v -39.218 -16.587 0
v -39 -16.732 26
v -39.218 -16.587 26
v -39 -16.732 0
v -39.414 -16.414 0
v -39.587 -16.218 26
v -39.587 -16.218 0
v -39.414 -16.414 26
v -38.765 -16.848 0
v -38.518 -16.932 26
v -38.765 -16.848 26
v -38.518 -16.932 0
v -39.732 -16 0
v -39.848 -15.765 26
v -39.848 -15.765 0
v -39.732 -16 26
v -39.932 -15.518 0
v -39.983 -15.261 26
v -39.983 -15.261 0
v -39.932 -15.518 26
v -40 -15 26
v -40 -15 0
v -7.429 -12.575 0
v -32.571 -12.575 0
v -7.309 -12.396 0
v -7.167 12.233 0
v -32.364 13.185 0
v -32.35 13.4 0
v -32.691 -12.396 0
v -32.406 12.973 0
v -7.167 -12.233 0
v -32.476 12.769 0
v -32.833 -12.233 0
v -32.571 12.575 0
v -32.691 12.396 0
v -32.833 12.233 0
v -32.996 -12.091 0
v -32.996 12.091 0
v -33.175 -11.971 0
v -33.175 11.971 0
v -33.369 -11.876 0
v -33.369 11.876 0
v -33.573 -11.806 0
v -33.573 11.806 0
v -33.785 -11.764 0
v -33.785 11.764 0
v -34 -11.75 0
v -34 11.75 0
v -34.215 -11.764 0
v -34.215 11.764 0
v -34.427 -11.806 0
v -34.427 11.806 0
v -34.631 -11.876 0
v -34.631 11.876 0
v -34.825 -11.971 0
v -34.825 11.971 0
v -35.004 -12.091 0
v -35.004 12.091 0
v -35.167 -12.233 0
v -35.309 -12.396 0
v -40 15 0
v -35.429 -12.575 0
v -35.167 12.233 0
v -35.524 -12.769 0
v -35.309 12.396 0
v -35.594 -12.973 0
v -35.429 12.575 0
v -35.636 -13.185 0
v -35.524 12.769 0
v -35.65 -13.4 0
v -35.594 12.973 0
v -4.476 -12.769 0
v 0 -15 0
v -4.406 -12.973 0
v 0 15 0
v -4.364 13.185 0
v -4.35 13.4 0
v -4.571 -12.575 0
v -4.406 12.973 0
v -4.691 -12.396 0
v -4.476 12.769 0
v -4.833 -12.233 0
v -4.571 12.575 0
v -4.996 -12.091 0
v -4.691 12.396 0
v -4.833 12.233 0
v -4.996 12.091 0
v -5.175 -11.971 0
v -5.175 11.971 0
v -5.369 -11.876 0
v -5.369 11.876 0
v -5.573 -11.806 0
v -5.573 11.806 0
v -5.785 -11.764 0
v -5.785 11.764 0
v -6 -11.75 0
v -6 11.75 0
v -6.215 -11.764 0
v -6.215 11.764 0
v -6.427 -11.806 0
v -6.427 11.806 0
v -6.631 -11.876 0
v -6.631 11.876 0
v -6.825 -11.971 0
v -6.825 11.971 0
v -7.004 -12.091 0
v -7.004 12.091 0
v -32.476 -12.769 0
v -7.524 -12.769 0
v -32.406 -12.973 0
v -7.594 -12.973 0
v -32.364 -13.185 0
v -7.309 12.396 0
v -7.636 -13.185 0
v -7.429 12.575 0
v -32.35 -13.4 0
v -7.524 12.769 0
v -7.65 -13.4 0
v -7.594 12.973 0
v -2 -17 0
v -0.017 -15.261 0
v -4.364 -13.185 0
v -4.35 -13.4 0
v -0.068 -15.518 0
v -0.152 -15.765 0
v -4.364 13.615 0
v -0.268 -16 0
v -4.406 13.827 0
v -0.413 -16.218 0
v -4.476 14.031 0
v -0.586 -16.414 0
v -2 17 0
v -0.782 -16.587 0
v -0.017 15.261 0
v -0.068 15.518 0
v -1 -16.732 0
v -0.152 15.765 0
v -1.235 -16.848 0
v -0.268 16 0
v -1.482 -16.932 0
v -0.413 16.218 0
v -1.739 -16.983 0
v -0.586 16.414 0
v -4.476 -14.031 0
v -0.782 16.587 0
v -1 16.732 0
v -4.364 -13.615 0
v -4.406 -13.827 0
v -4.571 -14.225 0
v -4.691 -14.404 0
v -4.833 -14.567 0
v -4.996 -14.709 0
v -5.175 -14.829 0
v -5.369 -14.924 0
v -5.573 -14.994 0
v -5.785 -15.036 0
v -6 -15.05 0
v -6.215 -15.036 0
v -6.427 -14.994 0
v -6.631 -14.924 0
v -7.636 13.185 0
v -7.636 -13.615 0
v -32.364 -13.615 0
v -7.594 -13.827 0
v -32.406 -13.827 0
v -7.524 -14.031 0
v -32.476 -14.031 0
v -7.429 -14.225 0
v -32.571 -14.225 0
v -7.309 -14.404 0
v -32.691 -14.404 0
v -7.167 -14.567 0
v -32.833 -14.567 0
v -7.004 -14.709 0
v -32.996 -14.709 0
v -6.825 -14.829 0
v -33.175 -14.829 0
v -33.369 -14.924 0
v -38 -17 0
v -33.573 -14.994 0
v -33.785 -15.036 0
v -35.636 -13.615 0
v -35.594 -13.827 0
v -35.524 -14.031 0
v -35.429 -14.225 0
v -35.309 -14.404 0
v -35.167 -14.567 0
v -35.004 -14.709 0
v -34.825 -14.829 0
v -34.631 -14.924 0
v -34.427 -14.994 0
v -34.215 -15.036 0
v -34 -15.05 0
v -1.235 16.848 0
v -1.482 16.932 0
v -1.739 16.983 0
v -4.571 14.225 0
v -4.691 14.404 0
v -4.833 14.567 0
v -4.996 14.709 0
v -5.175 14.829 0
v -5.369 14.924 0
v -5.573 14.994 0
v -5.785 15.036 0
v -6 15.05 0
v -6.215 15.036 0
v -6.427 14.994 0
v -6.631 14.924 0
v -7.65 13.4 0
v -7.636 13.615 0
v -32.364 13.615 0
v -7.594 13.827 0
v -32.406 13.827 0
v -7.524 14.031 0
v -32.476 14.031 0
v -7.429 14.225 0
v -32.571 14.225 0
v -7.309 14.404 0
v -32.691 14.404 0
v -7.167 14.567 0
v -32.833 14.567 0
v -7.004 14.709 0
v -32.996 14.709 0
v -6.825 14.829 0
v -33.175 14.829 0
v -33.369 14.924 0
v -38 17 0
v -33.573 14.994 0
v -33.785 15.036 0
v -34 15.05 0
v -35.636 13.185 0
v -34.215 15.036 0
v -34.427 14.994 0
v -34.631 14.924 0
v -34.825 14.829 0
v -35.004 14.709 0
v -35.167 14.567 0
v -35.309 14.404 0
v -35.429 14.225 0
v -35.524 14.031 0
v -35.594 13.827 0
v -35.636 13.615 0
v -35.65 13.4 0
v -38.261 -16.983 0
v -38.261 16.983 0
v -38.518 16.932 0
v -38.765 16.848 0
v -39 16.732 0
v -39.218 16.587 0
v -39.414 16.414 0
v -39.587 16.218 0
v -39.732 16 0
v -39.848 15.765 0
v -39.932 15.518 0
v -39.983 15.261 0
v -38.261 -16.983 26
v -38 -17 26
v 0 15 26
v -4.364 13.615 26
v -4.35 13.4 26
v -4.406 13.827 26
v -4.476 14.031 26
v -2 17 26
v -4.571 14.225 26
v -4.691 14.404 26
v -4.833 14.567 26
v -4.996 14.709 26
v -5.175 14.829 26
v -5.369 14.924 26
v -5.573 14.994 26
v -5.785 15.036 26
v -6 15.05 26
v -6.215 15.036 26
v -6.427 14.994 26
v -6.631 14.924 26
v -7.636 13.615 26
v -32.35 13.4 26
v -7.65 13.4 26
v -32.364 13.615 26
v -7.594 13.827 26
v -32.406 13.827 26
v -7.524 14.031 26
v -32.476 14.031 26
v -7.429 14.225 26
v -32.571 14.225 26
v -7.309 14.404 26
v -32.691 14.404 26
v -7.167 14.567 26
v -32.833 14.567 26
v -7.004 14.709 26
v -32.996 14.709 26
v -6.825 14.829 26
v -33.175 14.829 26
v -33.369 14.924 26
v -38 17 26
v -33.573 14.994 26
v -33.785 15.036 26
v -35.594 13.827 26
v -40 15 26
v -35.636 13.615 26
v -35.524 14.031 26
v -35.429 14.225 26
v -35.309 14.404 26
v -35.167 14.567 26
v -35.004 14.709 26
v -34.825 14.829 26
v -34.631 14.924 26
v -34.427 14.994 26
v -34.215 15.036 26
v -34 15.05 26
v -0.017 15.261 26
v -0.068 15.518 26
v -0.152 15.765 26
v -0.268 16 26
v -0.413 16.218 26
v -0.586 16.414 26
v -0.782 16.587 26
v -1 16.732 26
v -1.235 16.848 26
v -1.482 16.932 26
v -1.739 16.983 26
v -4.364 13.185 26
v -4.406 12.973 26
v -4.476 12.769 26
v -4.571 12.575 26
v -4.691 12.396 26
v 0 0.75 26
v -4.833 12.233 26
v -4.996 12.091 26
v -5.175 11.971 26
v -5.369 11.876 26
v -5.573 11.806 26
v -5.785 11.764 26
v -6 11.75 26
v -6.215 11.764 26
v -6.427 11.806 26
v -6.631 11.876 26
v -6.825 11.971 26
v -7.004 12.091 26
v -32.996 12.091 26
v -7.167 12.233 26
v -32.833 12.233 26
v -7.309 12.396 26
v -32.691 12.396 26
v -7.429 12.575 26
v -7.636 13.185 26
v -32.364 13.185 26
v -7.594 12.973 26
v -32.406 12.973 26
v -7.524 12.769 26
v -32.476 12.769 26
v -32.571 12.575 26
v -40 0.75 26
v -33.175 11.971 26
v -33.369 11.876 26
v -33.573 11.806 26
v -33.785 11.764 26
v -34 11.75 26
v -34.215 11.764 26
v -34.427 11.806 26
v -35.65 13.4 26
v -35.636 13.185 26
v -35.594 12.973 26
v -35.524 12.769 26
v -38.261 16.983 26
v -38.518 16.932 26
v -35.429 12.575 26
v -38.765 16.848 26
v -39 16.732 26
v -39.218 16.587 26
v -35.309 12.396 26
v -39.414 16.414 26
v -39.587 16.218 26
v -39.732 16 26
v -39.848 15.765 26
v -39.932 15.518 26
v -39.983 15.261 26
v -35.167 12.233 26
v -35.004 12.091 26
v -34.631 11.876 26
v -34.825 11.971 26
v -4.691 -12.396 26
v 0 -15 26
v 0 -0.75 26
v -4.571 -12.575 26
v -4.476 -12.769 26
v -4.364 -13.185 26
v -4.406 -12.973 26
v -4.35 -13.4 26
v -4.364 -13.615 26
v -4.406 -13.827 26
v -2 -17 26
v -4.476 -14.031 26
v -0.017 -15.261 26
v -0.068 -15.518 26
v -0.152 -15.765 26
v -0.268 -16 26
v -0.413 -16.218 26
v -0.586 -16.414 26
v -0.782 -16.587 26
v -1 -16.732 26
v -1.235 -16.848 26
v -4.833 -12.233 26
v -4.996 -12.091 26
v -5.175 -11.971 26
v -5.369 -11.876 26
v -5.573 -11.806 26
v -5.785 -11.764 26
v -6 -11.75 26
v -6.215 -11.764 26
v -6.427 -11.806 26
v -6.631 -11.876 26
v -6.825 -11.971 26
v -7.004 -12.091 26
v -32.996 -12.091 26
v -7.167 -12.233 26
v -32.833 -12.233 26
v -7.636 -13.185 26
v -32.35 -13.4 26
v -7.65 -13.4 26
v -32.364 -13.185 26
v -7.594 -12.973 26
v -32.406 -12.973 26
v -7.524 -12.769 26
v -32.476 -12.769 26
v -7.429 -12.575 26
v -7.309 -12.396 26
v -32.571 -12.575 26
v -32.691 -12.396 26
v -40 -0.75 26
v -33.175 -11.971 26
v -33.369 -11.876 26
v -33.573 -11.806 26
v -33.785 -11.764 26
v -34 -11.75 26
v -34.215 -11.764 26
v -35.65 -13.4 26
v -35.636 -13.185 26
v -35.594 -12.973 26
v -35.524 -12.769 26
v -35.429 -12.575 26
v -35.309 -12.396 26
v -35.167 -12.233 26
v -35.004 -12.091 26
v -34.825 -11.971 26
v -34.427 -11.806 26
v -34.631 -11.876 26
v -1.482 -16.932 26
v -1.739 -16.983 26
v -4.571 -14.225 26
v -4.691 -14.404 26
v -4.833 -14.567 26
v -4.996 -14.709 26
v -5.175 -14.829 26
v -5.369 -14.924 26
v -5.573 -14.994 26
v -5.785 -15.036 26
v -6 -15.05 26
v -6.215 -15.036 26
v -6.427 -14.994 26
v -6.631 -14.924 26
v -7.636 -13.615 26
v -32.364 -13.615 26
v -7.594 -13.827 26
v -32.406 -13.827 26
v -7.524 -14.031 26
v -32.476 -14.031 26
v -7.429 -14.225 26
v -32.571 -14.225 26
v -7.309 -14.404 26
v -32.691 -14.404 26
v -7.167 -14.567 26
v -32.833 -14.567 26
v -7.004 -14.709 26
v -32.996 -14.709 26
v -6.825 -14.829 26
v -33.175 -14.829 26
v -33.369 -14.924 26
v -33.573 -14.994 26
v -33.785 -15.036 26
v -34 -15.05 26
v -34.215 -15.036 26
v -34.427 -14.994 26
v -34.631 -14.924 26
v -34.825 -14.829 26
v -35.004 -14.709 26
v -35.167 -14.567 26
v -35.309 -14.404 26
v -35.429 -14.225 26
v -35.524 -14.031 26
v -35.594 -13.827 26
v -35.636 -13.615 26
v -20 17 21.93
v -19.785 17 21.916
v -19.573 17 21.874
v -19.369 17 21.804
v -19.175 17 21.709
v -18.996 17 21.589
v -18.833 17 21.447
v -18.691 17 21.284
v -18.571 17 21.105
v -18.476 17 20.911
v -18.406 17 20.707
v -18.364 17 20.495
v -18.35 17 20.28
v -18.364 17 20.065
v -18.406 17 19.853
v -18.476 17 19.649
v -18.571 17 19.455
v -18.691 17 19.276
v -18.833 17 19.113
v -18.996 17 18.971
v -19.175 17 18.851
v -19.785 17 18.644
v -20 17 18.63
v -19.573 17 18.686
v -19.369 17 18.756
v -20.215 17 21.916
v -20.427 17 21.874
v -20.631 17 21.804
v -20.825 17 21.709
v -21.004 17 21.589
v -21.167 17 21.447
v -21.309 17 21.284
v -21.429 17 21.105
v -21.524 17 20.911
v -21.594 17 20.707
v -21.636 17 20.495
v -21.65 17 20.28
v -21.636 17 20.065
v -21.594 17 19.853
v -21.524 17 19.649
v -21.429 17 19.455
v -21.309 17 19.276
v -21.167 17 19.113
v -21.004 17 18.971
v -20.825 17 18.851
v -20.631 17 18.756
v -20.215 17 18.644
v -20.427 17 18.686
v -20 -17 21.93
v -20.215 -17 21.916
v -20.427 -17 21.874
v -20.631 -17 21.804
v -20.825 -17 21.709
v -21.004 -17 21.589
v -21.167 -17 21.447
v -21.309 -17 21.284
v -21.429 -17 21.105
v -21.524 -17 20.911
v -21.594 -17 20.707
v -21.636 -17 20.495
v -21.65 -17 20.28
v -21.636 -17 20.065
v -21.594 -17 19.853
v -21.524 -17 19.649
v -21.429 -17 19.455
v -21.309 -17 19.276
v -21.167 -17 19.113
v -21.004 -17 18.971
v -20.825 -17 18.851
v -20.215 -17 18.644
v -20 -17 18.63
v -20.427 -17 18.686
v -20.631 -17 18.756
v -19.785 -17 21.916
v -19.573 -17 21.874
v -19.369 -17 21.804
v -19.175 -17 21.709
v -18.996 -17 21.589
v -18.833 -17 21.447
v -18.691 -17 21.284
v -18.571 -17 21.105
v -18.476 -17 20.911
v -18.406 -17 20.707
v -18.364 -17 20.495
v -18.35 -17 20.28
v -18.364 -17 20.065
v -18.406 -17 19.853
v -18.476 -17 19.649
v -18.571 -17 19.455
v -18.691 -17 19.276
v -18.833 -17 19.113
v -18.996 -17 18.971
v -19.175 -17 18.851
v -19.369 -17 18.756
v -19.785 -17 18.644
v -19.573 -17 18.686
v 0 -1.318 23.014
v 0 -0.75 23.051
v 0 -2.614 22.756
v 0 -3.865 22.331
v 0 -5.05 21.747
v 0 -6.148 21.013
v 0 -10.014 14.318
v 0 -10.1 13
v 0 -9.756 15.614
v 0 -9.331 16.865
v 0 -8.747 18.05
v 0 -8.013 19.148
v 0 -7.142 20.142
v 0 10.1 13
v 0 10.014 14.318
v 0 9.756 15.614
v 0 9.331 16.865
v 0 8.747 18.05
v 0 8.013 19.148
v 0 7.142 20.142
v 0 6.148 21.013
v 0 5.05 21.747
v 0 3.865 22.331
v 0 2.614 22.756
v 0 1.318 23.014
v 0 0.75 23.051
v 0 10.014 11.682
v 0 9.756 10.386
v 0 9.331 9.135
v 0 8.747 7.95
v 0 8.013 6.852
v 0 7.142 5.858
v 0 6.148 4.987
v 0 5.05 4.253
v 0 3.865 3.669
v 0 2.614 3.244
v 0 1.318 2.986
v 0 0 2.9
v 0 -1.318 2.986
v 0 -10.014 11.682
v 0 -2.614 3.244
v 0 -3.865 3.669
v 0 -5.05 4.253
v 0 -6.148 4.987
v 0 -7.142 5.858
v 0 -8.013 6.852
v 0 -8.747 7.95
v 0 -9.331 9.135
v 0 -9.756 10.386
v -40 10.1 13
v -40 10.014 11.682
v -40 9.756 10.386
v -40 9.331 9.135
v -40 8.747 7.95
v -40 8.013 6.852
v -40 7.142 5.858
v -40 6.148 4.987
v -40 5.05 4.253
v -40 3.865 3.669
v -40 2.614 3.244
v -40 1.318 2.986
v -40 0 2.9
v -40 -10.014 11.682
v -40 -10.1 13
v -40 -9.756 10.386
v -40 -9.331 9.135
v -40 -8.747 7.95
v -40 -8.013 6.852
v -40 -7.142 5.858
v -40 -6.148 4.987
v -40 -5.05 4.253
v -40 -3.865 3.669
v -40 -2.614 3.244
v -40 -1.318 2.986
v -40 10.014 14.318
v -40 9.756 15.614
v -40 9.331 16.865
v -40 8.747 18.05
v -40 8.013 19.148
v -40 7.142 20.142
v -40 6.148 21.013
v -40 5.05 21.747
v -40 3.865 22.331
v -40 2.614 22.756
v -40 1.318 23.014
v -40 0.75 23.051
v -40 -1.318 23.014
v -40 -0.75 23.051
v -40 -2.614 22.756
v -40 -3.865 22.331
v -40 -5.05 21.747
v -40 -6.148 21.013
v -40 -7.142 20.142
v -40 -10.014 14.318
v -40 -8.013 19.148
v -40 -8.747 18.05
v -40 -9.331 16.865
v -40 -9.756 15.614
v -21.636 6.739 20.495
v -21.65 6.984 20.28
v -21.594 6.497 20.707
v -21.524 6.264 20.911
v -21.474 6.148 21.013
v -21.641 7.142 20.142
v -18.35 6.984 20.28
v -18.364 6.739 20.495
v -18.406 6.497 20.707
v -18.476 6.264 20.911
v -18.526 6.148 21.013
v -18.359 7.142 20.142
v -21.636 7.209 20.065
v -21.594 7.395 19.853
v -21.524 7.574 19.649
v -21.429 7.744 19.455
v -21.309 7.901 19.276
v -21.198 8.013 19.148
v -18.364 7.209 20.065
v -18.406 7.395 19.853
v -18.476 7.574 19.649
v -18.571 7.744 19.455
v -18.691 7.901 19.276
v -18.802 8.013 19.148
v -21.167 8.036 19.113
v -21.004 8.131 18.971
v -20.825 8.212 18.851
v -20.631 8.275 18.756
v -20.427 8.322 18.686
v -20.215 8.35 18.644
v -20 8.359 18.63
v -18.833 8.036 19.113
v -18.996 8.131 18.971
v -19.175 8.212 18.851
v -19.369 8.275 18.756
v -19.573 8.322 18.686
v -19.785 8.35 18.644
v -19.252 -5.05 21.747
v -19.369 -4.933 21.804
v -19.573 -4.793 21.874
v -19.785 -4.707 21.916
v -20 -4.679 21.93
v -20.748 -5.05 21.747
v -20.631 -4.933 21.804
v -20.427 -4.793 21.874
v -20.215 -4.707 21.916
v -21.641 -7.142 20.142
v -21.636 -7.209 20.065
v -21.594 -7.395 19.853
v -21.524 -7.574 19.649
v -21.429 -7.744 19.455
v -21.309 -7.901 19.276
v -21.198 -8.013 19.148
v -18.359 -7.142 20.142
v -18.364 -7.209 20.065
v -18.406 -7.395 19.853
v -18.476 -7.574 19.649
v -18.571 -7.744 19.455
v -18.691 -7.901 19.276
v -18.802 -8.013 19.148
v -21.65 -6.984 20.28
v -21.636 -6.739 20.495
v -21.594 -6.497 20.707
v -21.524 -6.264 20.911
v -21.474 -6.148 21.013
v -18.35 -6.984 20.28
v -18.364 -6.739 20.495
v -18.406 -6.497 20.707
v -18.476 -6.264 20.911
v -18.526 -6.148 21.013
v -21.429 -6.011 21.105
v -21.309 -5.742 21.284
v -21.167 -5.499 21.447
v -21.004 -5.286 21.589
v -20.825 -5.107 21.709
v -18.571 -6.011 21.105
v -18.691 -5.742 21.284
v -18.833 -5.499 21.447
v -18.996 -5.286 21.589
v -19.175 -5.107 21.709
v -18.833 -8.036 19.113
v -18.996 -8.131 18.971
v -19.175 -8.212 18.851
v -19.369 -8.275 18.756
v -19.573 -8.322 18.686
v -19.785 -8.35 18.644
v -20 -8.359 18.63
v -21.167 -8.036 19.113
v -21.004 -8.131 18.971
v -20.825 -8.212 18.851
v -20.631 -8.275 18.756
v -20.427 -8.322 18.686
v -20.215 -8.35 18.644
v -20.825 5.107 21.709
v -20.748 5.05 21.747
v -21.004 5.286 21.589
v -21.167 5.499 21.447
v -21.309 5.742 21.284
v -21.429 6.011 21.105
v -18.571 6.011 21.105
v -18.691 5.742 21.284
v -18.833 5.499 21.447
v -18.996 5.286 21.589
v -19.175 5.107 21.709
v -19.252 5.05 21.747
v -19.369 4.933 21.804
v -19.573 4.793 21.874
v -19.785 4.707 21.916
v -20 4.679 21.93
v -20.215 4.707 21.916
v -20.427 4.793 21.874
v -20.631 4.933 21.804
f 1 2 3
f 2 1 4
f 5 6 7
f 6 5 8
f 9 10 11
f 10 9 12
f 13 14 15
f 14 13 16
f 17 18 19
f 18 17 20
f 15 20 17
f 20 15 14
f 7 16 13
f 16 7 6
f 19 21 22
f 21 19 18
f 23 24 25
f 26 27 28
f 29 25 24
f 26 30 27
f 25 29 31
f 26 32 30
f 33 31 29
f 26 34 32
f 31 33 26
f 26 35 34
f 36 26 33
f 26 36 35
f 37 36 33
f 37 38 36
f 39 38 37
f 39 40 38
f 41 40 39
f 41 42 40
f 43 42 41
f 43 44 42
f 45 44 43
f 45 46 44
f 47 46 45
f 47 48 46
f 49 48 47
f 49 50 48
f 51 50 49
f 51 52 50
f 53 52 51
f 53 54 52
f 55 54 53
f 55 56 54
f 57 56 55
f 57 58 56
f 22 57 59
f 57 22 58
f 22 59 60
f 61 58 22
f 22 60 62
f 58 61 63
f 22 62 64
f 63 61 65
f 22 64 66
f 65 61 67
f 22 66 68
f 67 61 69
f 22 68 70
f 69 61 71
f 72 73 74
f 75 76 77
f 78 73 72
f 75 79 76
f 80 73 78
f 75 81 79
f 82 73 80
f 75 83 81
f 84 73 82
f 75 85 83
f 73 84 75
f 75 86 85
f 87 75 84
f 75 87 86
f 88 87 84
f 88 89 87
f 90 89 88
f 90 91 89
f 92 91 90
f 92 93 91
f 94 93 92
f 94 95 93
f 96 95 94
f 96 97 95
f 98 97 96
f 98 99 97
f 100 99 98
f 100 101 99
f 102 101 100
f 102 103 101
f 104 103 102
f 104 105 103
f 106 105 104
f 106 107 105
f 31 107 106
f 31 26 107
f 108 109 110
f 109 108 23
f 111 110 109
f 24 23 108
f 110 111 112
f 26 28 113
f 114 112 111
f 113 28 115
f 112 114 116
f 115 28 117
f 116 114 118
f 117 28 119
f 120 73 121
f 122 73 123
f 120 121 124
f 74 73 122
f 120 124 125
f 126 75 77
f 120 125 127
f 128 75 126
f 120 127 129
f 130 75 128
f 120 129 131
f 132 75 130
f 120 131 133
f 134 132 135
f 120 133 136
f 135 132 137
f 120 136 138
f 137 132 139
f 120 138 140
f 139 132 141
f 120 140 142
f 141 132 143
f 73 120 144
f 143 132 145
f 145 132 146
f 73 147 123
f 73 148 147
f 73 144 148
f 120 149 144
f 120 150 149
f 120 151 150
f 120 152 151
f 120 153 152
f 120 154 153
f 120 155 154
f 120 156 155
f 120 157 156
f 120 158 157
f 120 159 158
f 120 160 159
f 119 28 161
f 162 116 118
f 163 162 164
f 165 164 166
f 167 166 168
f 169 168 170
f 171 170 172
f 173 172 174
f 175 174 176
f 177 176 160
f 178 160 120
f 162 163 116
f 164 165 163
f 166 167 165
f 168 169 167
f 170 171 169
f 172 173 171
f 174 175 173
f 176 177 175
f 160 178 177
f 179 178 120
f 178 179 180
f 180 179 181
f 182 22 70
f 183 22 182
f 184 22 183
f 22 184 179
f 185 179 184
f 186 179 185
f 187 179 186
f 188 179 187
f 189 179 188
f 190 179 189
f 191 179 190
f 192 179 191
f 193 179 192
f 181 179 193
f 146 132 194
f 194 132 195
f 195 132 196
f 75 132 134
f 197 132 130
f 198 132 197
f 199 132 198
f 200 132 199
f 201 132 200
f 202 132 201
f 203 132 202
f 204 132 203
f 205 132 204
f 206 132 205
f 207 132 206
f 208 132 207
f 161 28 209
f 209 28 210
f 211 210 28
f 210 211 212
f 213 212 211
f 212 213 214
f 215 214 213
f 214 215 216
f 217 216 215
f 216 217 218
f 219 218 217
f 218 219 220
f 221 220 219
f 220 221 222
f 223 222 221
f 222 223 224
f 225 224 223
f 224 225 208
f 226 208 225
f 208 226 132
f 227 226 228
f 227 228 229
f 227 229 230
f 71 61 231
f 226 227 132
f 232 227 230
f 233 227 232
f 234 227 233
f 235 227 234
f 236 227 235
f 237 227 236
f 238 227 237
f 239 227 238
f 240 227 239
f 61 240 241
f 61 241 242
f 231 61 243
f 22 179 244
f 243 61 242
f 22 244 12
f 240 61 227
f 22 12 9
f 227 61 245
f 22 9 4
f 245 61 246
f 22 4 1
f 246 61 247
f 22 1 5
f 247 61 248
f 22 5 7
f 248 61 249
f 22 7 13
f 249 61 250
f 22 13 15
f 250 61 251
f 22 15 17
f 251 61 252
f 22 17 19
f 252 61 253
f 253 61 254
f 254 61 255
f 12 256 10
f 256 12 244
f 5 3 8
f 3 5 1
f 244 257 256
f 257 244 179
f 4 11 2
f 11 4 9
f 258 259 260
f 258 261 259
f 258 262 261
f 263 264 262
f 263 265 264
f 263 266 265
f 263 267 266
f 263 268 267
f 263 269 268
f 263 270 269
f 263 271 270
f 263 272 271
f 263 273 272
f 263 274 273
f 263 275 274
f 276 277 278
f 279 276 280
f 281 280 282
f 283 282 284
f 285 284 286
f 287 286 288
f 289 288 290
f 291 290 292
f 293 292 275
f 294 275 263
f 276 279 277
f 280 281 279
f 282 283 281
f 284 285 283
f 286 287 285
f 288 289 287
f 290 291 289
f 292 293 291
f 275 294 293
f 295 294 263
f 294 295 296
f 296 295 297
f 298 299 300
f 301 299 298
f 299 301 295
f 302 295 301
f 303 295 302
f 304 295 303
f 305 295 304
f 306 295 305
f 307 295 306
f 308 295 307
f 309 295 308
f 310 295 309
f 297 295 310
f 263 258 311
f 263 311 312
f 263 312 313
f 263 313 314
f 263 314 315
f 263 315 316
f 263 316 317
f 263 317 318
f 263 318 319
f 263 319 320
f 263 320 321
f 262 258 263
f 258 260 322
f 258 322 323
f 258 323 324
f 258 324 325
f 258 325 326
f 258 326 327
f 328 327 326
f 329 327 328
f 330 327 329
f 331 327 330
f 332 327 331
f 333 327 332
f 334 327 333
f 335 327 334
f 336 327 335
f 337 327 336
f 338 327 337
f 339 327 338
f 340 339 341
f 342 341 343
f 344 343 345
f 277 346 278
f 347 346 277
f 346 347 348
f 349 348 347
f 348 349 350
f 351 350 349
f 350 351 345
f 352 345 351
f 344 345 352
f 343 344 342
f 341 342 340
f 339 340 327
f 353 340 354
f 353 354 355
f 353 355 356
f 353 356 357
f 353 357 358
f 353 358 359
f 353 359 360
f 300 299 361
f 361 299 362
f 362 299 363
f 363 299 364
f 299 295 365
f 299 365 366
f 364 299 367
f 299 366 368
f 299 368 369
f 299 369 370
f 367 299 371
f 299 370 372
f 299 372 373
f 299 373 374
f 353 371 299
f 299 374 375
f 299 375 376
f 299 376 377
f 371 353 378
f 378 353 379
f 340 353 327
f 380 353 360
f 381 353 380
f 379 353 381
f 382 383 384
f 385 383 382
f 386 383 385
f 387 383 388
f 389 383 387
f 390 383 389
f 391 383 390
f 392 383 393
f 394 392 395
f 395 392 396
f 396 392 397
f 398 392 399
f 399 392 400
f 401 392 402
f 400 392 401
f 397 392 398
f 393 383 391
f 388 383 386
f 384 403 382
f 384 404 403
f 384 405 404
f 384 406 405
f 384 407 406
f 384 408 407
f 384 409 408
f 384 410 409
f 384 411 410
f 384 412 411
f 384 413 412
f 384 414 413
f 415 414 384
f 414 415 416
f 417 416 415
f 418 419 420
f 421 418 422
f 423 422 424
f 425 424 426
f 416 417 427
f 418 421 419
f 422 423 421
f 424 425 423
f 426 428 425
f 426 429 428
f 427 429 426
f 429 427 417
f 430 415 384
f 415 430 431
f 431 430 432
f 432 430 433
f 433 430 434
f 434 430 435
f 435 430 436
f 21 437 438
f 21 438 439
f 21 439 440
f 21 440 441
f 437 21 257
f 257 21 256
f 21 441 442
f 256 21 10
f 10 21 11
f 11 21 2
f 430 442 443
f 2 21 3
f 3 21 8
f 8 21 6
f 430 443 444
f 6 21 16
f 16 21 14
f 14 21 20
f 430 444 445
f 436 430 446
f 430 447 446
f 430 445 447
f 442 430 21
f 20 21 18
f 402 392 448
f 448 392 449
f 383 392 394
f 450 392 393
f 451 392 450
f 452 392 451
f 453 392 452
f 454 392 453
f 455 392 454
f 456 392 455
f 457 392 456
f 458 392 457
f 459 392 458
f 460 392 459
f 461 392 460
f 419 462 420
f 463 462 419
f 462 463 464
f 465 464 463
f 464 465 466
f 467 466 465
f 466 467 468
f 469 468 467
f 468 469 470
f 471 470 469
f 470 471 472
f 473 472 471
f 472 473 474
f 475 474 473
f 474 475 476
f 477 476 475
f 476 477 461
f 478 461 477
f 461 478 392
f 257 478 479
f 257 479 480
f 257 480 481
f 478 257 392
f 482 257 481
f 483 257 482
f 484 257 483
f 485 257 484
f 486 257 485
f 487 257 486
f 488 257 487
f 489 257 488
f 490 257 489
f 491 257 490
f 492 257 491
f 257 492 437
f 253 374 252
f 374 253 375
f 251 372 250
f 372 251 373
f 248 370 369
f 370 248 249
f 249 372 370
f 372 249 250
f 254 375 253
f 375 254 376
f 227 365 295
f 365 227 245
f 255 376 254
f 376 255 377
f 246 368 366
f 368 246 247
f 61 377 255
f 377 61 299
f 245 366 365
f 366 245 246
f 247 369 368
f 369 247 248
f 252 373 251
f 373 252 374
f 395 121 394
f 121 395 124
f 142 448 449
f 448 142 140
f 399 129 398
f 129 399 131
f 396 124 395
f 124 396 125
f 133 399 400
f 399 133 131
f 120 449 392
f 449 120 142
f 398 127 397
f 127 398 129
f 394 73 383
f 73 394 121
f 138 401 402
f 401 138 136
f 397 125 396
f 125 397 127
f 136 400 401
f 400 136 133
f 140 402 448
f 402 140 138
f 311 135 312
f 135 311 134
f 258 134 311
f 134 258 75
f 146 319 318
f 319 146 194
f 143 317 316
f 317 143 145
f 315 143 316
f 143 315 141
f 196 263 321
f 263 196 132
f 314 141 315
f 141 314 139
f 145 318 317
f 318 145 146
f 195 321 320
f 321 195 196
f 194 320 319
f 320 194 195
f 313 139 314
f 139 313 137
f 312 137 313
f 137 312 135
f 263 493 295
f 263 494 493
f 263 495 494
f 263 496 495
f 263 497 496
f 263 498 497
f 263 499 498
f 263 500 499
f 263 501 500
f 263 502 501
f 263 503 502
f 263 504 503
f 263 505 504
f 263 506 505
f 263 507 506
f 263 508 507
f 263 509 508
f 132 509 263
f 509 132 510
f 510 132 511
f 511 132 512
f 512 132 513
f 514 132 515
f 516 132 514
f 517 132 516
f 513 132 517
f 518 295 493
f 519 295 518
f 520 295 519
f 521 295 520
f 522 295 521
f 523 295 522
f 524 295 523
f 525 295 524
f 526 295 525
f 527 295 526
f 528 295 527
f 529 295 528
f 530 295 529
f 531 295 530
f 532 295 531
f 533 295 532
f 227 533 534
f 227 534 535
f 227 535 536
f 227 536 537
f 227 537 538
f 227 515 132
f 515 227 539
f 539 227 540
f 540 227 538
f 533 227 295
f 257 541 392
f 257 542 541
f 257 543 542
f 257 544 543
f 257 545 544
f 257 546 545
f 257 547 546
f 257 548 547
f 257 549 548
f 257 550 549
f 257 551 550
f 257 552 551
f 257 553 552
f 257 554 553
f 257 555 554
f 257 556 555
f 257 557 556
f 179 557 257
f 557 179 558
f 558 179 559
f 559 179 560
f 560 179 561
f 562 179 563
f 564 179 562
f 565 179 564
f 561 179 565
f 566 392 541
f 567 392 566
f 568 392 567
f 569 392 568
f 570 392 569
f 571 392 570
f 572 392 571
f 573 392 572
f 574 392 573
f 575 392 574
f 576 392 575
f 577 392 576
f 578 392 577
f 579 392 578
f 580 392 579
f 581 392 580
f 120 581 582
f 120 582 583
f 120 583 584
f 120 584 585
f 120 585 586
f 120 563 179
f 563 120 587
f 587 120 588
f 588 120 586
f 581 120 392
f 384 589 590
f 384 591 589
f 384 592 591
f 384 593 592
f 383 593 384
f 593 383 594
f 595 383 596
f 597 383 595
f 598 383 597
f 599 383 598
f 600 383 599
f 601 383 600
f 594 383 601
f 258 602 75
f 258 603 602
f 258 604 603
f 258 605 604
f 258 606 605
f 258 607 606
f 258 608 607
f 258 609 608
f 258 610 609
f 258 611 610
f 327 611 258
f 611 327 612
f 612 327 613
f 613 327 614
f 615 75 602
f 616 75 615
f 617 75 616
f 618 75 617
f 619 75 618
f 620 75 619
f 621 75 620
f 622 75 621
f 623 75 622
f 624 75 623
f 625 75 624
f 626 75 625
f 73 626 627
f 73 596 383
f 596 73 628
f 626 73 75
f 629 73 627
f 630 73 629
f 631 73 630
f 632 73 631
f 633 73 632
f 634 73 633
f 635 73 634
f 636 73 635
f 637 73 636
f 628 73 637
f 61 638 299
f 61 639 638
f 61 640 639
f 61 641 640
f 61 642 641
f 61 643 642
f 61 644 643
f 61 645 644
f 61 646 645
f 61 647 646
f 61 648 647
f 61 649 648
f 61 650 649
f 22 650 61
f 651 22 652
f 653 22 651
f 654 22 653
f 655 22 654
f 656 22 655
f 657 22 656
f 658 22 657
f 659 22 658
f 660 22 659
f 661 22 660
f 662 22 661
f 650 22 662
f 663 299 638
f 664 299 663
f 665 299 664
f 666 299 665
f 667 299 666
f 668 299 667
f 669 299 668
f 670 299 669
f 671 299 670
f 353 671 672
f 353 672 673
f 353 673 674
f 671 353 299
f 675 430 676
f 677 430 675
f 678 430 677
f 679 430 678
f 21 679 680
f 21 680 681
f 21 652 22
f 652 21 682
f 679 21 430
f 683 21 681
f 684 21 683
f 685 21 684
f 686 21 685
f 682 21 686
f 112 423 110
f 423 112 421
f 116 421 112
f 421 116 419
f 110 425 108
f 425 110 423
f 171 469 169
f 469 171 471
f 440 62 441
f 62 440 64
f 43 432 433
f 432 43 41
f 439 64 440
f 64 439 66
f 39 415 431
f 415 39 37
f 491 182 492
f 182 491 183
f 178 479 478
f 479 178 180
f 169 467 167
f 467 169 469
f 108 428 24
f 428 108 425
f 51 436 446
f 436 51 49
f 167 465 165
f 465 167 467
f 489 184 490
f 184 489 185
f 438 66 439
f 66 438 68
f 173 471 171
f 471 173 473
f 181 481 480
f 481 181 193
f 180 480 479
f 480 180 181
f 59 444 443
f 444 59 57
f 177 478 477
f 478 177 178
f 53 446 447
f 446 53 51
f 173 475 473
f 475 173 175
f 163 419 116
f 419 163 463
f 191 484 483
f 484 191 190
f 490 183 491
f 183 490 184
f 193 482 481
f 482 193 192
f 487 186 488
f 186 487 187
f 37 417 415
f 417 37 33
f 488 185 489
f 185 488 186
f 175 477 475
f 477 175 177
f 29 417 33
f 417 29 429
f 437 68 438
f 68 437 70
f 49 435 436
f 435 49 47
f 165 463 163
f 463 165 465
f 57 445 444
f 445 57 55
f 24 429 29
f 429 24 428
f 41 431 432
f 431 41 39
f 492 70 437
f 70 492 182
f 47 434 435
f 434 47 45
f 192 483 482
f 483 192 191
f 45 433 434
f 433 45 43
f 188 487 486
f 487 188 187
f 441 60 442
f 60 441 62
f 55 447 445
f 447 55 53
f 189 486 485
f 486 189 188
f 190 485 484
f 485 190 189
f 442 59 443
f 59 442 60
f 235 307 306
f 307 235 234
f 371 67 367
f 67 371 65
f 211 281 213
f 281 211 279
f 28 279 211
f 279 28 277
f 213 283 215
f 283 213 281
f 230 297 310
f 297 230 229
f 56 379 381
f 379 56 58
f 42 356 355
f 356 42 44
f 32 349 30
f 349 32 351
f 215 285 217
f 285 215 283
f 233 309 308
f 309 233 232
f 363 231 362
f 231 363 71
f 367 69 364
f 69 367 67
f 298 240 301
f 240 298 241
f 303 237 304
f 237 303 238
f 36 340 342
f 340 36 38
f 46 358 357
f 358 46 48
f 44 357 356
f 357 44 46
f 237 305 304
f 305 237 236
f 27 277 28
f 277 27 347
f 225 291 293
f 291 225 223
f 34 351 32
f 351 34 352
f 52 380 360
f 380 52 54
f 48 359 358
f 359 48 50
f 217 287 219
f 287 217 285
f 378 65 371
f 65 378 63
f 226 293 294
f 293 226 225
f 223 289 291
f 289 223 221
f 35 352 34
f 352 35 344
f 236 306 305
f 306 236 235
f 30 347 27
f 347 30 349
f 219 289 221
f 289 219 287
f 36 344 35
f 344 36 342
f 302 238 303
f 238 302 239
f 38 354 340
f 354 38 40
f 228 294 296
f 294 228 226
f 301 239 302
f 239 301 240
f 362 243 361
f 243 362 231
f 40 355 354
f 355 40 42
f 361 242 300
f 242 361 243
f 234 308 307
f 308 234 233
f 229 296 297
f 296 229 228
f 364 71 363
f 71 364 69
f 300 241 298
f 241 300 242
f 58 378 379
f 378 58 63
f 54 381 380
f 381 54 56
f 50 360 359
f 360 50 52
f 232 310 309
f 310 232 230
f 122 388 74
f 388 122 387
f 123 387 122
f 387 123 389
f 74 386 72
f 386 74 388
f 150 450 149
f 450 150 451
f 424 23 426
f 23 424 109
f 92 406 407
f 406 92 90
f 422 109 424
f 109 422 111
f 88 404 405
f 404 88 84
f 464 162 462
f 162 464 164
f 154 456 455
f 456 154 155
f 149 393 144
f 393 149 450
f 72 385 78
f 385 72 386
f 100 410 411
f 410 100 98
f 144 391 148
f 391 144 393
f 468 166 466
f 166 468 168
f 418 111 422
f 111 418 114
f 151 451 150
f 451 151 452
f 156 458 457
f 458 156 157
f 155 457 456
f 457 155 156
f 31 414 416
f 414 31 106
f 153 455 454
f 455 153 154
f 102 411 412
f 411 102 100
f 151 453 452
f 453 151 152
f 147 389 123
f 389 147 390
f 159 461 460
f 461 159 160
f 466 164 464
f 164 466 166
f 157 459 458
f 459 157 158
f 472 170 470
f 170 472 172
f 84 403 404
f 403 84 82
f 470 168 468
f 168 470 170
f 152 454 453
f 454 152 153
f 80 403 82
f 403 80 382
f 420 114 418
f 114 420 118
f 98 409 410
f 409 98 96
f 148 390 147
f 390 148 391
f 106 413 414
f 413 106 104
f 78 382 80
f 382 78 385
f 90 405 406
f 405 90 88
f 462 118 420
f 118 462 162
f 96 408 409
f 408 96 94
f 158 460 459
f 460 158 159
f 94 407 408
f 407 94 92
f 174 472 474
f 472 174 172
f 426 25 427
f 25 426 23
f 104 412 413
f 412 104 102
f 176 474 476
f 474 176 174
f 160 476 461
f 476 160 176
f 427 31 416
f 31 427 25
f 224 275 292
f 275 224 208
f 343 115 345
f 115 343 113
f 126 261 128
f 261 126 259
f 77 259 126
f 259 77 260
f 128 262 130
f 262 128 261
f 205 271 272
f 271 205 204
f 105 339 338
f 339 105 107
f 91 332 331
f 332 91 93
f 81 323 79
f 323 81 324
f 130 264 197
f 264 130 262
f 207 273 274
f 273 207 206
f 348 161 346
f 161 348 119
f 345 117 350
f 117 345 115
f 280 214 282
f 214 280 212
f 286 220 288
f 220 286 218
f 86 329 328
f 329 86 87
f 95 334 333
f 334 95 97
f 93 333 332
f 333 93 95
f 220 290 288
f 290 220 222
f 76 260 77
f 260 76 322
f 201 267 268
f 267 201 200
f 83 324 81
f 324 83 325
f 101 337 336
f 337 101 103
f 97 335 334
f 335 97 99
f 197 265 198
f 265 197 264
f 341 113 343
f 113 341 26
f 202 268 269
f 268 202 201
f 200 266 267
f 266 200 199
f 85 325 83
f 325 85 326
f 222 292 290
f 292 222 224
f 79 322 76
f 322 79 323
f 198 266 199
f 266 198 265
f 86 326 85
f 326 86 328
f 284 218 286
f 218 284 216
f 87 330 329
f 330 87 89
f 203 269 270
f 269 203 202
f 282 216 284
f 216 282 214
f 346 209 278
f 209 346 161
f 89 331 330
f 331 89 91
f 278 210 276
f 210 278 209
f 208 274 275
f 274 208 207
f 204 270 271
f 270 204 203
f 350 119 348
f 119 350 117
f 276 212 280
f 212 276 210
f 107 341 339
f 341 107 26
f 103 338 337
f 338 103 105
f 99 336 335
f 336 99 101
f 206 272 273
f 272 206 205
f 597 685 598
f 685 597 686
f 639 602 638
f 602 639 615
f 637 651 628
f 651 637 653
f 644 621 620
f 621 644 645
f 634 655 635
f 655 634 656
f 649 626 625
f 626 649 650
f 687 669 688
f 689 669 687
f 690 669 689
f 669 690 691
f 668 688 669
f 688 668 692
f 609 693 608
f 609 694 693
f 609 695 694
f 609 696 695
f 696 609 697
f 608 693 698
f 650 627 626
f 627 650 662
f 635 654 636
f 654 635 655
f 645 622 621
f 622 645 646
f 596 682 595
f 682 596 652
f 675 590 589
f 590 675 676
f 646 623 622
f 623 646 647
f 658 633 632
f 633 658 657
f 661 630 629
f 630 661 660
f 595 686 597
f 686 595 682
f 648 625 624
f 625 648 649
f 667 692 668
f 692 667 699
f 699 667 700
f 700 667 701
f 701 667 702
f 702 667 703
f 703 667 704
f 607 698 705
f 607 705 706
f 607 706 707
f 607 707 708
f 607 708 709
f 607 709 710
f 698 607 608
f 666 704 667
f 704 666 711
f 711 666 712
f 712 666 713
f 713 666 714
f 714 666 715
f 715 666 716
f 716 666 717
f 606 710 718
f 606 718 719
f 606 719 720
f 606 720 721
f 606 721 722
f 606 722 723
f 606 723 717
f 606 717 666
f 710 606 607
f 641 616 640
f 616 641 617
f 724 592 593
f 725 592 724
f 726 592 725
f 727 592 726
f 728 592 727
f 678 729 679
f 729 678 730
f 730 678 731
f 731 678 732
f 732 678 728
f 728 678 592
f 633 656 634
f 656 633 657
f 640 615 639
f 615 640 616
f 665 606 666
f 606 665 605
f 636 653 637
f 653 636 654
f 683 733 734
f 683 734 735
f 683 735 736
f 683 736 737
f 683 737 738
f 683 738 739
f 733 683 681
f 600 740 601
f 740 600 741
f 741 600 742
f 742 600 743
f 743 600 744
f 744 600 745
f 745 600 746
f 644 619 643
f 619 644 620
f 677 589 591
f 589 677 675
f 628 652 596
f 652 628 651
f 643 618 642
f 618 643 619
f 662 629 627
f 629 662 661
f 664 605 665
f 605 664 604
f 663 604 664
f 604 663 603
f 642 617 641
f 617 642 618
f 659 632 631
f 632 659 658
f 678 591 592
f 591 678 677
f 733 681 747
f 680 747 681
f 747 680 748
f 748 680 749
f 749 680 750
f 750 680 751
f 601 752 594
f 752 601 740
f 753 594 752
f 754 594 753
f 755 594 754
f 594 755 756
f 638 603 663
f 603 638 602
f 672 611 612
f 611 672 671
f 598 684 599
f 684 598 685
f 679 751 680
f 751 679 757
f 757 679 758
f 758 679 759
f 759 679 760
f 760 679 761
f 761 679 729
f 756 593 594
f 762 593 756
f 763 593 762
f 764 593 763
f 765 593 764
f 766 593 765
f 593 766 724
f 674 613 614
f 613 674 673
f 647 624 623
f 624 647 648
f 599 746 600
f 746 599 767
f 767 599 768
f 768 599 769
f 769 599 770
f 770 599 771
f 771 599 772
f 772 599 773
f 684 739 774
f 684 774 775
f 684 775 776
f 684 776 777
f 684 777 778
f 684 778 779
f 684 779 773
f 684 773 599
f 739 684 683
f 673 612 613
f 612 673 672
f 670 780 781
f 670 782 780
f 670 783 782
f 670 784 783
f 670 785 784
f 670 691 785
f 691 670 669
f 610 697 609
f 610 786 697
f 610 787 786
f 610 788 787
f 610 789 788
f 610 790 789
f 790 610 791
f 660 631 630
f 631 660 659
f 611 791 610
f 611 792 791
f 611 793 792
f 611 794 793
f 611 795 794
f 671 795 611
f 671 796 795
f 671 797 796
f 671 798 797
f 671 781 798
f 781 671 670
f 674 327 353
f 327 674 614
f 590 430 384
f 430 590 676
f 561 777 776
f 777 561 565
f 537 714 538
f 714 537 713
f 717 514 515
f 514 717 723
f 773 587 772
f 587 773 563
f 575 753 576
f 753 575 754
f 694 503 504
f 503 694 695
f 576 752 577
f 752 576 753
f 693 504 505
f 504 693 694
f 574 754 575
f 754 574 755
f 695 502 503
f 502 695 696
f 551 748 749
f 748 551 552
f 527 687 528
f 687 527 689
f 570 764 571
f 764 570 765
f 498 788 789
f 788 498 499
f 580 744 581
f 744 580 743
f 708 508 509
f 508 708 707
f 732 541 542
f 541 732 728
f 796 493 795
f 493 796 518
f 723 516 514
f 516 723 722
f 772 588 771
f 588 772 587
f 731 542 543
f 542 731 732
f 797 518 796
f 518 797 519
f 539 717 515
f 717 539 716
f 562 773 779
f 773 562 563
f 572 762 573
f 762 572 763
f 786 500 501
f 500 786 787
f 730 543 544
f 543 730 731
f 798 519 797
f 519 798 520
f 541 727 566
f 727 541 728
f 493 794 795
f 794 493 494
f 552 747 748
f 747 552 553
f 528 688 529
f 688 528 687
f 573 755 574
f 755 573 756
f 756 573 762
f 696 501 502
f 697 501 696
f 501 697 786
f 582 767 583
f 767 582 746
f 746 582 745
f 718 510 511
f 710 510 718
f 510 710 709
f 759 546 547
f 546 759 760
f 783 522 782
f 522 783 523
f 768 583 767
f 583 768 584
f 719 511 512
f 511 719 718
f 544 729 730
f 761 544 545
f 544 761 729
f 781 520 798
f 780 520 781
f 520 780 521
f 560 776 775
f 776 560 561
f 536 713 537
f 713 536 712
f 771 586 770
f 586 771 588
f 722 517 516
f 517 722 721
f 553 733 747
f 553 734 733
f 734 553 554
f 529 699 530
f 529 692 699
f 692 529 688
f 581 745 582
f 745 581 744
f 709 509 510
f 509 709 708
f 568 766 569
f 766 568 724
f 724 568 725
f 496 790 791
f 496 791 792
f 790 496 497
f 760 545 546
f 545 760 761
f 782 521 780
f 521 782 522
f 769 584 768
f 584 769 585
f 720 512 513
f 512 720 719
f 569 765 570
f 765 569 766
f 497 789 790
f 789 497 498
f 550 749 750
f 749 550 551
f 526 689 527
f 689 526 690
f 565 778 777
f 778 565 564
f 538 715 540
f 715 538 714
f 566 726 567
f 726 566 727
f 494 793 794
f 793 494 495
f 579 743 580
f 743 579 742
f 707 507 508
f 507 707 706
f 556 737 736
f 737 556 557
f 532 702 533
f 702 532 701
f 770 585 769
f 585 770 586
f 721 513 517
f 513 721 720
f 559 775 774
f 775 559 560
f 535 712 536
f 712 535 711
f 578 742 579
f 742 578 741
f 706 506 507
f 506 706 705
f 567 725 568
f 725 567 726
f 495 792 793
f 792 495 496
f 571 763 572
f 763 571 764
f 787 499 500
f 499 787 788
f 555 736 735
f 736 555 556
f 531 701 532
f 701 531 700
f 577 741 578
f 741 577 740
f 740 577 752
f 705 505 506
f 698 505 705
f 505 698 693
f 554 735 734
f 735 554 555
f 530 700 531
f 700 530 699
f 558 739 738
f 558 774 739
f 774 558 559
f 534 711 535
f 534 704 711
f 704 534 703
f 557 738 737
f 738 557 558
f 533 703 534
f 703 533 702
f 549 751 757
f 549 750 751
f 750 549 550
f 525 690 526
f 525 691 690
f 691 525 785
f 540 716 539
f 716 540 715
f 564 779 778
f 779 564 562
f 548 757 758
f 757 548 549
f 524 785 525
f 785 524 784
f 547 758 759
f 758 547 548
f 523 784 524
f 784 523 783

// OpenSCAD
// file: ../common/ds_lib.scad
// DronSwarm · librería común de piezas del frame (S07-S08). Unidades: mm.
//
// Reglas (ADR-003): sin hull()/minkowski()/offset() — FreeCAD los convierte en malla y el STEP deja de ser un
// sólido válido. Las formas redondeadas se arman con uniones de cubos y cilindros. El importador CSG de FreeCAD
// también falla con booleanas 2D y con varios operandos agrupados bajo una sola transformación: cada grupo de
// agujeros debe ser hijo directo del difference(), con su propio translate.
//
// Interfaz de motor DronSwarm (DMI, ADR-011): placa con 4 ranuras radiales a 90°, de modo que el mismo soporte
// acepta varios patrones comerciales y, más adelante, el motor propio (S17+) se diseña para caer en el mismo rango.
//   DMI-S: 4×M3, círculo de tornillos Ø16-Ø25 (motores 28xx-41xx, ≤ 600 W)
//   DMI-L: 4×M4, círculo de tornillos Ø30-Ø42 (motores 50xx-70xx, ≤ 2 kW)

$fn = 48;

M3 = 3.3; M3_HEAD = 6.0; M3_NUT = 6.4;     // pasante, cabeza, tuerca (entre caras + juego)
M4 = 4.4; M4_HEAD = 7.5;
M5 = 5.4;

function dmi_bolt(iface) = iface == "L" ? M4 : M3;
function dmi_r(iface) = iface == "L" ? [15, 21] : [8, 12.5];   // radio mínimo y máximo de las ranuras
function dmi_plate_d(iface) = iface == "L" ? 56 : 36;
function dmi_center(iface) = iface == "L" ? 16 : 10;            // eje, seguro y paso de cables

// Rectángulo con esquinas redondeadas (2D) y su extrusión
module rrect2d(size, r) {
    r2 = min(r, size[0] / 2 - 0.01, size[1] / 2 - 0.01);
    union() {
        translate([r2, 0]) square([size[0] - 2 * r2, size[1]]);
        translate([0, r2]) square([size[0], size[1] - 2 * r2]);
        for (x = [r2, size[0] - r2], y = [r2, size[1] - r2]) translate([x, y]) circle(r = r2);
    }
}
// Caja redondeada con primitivas 3D (sin booleanas 2D: el importador CSG de FreeCAD falla con ellas)
module rbox(size, r) {
    r2 = min(r, size[0] / 2 - 0.01, size[1] / 2 - 0.01);
    union() {
        translate([r2, 0, 0]) cube([size[0] - 2 * r2, size[1], size[2]]);
        translate([0, r2, 0]) cube([size[0], size[1] - 2 * r2, size[2]]);
        for (x = [r2, size[0] - r2], y = [r2, size[1] - r2]) translate([x, y, 0]) cylinder(r = r2, h = size[2]);
    }
}
module crbox(size, r) { translate([-size[0] / 2, -size[1] / 2, 0]) rbox(size, r); }   // centrado en x/y

// Ranura (2D) entre dos puntos sobre el eje x
module slot2d(r0, r1, w) {
    union() {
        translate([r0, -w / 2]) square([r1 - r0, w]);
        translate([r0, 0]) circle(d = w);
        translate([r1, 0]) circle(d = w);
    }
}

// Agujeros de la interfaz de motor (para restar de una placa de espesor t)
module slot3d(r0, r1, w, h) {
    union() {
        translate([r0, -w / 2, 0]) cube([r1 - r0, w, h]);
        translate([r0, 0, 0]) cylinder(d = w, h = h);
        translate([r1, 0, 0]) cylinder(d = w, h = h);
    }
}
module dmi_holes(iface, t) {
    r = dmi_r(iface);
    translate([0, 0, -1]) union() {
        cylinder(d = dmi_center(iface), h = t + 2);
        for (a = [45, 135, 225, 315]) rotate(a) slot3d(r[0], r[1], dmi_bolt(iface), t + 2);
    }
}

// Soporte de motor en la punta del brazo: manguito sobre el tubo + placa DMI arriba
//   el tubo entra por -x; la placa queda centrada en el eje del motor (origen), cara superior en z = 0
module motor_mount(tube_d, iface = "S", sleeve = 34, wall = 3.5) {
    od = tube_d + 2 * wall;
    pd = dmi_plate_d(iface);
    pt = iface == "L" ? 6 : 4;
    zc = -pt - tube_d / 2 - 1;                 // eje del tubo bajo la placa
    difference() {
        union() {
            translate([0, 0, -pt]) cylinder(d = pd, h = pt);                         // placa DMI
            translate([-sleeve - pd / 2 + 6, 0, zc]) rotate([0, 90, 0])
                cylinder(d = od, h = sleeve + pd / 2 - 6 + 4);                       // manguito
            translate([-sleeve - pd / 2 + 6, -od / 2, zc]) cube([sleeve + pd / 2 - 2, od, -zc - pt + 0.01]);  // alma
            translate([-sleeve - pd / 2 + 6, -5, zc - od / 2 - 7]) cube([sleeve, 10, 8]);   // oreja de apriete
        }
        dmi_holes(iface, pt + 0.02, $fn = 32);
        translate([-sleeve - pd / 2 + 5, 0, zc]) rotate([0, 90, 0]) cylinder(d = tube_d + 0.3, h = sleeve + pd / 2 - 3); // tubo
        translate([-sleeve - pd / 2 + 4, -1, zc - od / 2 - 8]) cube([sleeve + 1, 2, od / 2 + 6]);   // ranura de apriete
        for (x = [0.3, 0.75]) translate([-sleeve - pd / 2 + 6 + x * sleeve, 0, zc - od / 2 - 3])
            rotate([90, 0, 0]) cylinder(d = M3, h = 30, center = true);                // tornillos de apriete
        translate([-pd / 2 - 2, 0, zc]) rotate([0, 90, 0]) cylinder(d = 7, h = pd);   // salida de cables del tubo
    }
}

// Bloque de brazo entre las dos placas centrales (impreso PA12-CF): sujeta el tubo y separa las placas.
//   el tubo sale por +x desde el origen; el bloque ocupa x ∈ [-len, 0], altura = gap
module arm_block(tube_d, gap, len = 40, width = 0, bolt = M3) {
    w = width > 0 ? width : tube_d + 14;
    difference() {
        translate([-len, -w / 2, 0]) rbox([len, w, gap], 2);
        translate([-len - 1, 0, gap / 2]) rotate([0, 90, 0]) cylinder(d = tube_d + 0.2, h = len + 2);   // tubo
        translate([-len - 1, -0.75, gap / 2]) cube([len + 2, 1.5, gap / 2 + 1]);                        // ranura de apriete
        for (p = arm_block_bolts(tube_d, len, w)) translate([p[0], p[1], -1]) cylinder(d = bolt, h = gap + 2);
        translate([-len * 0.5, 0, gap * 0.78]) rotate([90, 0, 0]) cylinder(d = M3, h = w + 2, center = true);  // apriete
    }
}
function arm_block_bolts(tube_d, len, w) =
    [for (x = [-len + 6, -6], y = [-(w / 2 - 3.6), w / 2 - 3.6]) [x, y]];

// Patrón de controladora de vuelo (agujeros M3 en cuadrado)
module fc_holes(pattern, t) {
    for (x = [-1, 1], y = [-1, 1]) translate([x * pattern / 2, y * pattern / 2, -1]) cylinder(d = M3, h = t + 2);
}
// file: ds_i_params.scad
// DS-I · parámetros generados por tools/cad/gen_cad_params.py el 2026-10-19
// desde engineering/data/results (spec v1). No editar a mano: regenerar. Unidades: mm, kg.

vehicle = "DS-I";
rotors = 4;
wheelbase = 672;
arm_radius = 336;
prop_d = 431.8;
tube_od = 20;
tube_wall = 1;
arm_len = 252;
plate_d = 168;
plate_t = 3;
plate_gap = 26;
motor_iface = "S";
battery_dims = [134.4, 76.2, 48.8];
battery = "6S2P 50S";
leg_h = 160;
fold_arms = false;
mtow_kg = 2.695;
motor_mass_kg = 0.074;
fc_pattern = 30.5;
gimbal_box = [90, 70, 105];
gimbal_damper_pitch = [60, 50];
// file: ds_i_frame.scad
// DS-I · geometría compartida del frame: posiciones derivadas de los parámetros (spec v1). Unidades: mm.
// Ejes: x adelante, y izquierda, z arriba. z = 0 es la cara superior de la placa inferior.
// Cada pieza vive en su propio archivo (center_plate.scad, arm_block.scad, …) e incluye este.

include <ds_i_params.scad>
use <../common/ds_lib.scad>
include <../common/ds_lib.scad>

arm_angles = [45, 135, 225, 315];         // quad X
block_len = 40;
block_w = tube_od + 14;
r_block_out = plate_d / 2 - 3;            // extremo exterior del bloque de brazo
tube_z = plate_gap / 2;                   // eje de los tubos
tube_len = arm_radius - r_block_out + block_len - 8;   // dentro del bloque hasta el soporte de motor
leg_offset = 70;                          // patas abrazadas al brazo, a esta distancia del bloque
leg_r = r_block_out + leg_offset;
leg_tube = 12;                            // tubo de las patas Ø12×1
battery_pos = [-28, 0];                   // batería transversal, atrás, bajo la placa
gimbal_pos = [62, 0];                     // cámara adelante, colgada con amortiguadores
housing_size = [120, 90, 58];             // carcasa IP54 sobre la placa superior
housing_pos = [0, 0];

// Contorno de las placas centrales (2D): círculo con lóbulos bajo cada bloque de brazo
module plate_outline() {
    union() {
        circle(d = plate_d, $fn = 96);
        for (a = arm_angles) rotate(a) translate([r_block_out - block_len - 4, -block_w / 2 - 4]) square([block_len + 7, block_w + 8]);
    }
}

// Agujeros comunes a ambas placas: tornillos de los bloques
module plate_common_holes() {
    for (a = arm_angles) rotate(a) translate([r_block_out, 0])
        for (p = arm_block_bolts(tube_od, block_len, block_w)) translate(p) circle(d = M3);
}

// Posiciones de piezas montadas en las placas
gimbal_mount_bolts = [for (x = [-25, 25], y = [-32, 32]) [gimbal_pos[0] - 15 + x, y]];   // adaptador bajo la placa
battery_tray_bolts = [for (x = [-30, 30], y = [-46, 46]) [battery_pos[0] + x, y]];
housing_flange = 10;
// tornillos de la brida a 6 mm de la pared (afuera del canal de la junta, que va de 0.6 a 2.6 mm)
housing_bolts = [[66, 0], [-66, 0], [0, 51], [0, -51], [40, 51], [40, -51], [-40, 51], [-40, -51]];
cable_gland_pos = [-housing_size[0] / 2 + 18, 0];      // paso de cables al interior de la carcasa (prensaestopa M12)
motor_d = motor_iface == "L" ? 62 : 38;   // motor de referencia (COTS, se confirma en S09)
motor_h = motor_iface == "L" ? 36 : 26;
tray_t = 3;                               // bandeja de batería
gm_t = 4;                                 // placas del adaptador de cámara
damper_h = 10;                            // amortiguadores de silicona
foot_h = 45;                              // pie amortiguador de TPU (≈ 30 mm de carrera)
foot_stroke = 30;
// Altura de las patas por condición de diseño: con el pie comprimido, la cámara no toca el suelo (10 mm de margen)
gimbal_bottom_z = -plate_t - 2 * gm_t - damper_h - gimbal_box[2];
ground_z = gimbal_bottom_z - foot_stroke - 10;
leg_top_z = tube_z - (tube_od + 8) / 2 - 2;     // tope del tubo de la pata dentro de la abrazadera
leg_len = (leg_top_z - ground_z) - (foot_h - 12);
mm_sleeve = 26;                           // manguito del soporte de motor (FEA: FS 37 con 34 mm, se acorta)
// main file
// DS-I · bloque de brazo entre placas (impreso PA12-CF, ×4). Sujeta el tubo y separa las placas.
// Local: el tubo sale por +x desde x = 0; altura z ∈ [0, plate_gap]. Imprimir de costado (cara y = −w/2 en la cama).
include <ds_i_frame.scad>
arm_block(tube_od, plate_gap, block_len, block_w);
